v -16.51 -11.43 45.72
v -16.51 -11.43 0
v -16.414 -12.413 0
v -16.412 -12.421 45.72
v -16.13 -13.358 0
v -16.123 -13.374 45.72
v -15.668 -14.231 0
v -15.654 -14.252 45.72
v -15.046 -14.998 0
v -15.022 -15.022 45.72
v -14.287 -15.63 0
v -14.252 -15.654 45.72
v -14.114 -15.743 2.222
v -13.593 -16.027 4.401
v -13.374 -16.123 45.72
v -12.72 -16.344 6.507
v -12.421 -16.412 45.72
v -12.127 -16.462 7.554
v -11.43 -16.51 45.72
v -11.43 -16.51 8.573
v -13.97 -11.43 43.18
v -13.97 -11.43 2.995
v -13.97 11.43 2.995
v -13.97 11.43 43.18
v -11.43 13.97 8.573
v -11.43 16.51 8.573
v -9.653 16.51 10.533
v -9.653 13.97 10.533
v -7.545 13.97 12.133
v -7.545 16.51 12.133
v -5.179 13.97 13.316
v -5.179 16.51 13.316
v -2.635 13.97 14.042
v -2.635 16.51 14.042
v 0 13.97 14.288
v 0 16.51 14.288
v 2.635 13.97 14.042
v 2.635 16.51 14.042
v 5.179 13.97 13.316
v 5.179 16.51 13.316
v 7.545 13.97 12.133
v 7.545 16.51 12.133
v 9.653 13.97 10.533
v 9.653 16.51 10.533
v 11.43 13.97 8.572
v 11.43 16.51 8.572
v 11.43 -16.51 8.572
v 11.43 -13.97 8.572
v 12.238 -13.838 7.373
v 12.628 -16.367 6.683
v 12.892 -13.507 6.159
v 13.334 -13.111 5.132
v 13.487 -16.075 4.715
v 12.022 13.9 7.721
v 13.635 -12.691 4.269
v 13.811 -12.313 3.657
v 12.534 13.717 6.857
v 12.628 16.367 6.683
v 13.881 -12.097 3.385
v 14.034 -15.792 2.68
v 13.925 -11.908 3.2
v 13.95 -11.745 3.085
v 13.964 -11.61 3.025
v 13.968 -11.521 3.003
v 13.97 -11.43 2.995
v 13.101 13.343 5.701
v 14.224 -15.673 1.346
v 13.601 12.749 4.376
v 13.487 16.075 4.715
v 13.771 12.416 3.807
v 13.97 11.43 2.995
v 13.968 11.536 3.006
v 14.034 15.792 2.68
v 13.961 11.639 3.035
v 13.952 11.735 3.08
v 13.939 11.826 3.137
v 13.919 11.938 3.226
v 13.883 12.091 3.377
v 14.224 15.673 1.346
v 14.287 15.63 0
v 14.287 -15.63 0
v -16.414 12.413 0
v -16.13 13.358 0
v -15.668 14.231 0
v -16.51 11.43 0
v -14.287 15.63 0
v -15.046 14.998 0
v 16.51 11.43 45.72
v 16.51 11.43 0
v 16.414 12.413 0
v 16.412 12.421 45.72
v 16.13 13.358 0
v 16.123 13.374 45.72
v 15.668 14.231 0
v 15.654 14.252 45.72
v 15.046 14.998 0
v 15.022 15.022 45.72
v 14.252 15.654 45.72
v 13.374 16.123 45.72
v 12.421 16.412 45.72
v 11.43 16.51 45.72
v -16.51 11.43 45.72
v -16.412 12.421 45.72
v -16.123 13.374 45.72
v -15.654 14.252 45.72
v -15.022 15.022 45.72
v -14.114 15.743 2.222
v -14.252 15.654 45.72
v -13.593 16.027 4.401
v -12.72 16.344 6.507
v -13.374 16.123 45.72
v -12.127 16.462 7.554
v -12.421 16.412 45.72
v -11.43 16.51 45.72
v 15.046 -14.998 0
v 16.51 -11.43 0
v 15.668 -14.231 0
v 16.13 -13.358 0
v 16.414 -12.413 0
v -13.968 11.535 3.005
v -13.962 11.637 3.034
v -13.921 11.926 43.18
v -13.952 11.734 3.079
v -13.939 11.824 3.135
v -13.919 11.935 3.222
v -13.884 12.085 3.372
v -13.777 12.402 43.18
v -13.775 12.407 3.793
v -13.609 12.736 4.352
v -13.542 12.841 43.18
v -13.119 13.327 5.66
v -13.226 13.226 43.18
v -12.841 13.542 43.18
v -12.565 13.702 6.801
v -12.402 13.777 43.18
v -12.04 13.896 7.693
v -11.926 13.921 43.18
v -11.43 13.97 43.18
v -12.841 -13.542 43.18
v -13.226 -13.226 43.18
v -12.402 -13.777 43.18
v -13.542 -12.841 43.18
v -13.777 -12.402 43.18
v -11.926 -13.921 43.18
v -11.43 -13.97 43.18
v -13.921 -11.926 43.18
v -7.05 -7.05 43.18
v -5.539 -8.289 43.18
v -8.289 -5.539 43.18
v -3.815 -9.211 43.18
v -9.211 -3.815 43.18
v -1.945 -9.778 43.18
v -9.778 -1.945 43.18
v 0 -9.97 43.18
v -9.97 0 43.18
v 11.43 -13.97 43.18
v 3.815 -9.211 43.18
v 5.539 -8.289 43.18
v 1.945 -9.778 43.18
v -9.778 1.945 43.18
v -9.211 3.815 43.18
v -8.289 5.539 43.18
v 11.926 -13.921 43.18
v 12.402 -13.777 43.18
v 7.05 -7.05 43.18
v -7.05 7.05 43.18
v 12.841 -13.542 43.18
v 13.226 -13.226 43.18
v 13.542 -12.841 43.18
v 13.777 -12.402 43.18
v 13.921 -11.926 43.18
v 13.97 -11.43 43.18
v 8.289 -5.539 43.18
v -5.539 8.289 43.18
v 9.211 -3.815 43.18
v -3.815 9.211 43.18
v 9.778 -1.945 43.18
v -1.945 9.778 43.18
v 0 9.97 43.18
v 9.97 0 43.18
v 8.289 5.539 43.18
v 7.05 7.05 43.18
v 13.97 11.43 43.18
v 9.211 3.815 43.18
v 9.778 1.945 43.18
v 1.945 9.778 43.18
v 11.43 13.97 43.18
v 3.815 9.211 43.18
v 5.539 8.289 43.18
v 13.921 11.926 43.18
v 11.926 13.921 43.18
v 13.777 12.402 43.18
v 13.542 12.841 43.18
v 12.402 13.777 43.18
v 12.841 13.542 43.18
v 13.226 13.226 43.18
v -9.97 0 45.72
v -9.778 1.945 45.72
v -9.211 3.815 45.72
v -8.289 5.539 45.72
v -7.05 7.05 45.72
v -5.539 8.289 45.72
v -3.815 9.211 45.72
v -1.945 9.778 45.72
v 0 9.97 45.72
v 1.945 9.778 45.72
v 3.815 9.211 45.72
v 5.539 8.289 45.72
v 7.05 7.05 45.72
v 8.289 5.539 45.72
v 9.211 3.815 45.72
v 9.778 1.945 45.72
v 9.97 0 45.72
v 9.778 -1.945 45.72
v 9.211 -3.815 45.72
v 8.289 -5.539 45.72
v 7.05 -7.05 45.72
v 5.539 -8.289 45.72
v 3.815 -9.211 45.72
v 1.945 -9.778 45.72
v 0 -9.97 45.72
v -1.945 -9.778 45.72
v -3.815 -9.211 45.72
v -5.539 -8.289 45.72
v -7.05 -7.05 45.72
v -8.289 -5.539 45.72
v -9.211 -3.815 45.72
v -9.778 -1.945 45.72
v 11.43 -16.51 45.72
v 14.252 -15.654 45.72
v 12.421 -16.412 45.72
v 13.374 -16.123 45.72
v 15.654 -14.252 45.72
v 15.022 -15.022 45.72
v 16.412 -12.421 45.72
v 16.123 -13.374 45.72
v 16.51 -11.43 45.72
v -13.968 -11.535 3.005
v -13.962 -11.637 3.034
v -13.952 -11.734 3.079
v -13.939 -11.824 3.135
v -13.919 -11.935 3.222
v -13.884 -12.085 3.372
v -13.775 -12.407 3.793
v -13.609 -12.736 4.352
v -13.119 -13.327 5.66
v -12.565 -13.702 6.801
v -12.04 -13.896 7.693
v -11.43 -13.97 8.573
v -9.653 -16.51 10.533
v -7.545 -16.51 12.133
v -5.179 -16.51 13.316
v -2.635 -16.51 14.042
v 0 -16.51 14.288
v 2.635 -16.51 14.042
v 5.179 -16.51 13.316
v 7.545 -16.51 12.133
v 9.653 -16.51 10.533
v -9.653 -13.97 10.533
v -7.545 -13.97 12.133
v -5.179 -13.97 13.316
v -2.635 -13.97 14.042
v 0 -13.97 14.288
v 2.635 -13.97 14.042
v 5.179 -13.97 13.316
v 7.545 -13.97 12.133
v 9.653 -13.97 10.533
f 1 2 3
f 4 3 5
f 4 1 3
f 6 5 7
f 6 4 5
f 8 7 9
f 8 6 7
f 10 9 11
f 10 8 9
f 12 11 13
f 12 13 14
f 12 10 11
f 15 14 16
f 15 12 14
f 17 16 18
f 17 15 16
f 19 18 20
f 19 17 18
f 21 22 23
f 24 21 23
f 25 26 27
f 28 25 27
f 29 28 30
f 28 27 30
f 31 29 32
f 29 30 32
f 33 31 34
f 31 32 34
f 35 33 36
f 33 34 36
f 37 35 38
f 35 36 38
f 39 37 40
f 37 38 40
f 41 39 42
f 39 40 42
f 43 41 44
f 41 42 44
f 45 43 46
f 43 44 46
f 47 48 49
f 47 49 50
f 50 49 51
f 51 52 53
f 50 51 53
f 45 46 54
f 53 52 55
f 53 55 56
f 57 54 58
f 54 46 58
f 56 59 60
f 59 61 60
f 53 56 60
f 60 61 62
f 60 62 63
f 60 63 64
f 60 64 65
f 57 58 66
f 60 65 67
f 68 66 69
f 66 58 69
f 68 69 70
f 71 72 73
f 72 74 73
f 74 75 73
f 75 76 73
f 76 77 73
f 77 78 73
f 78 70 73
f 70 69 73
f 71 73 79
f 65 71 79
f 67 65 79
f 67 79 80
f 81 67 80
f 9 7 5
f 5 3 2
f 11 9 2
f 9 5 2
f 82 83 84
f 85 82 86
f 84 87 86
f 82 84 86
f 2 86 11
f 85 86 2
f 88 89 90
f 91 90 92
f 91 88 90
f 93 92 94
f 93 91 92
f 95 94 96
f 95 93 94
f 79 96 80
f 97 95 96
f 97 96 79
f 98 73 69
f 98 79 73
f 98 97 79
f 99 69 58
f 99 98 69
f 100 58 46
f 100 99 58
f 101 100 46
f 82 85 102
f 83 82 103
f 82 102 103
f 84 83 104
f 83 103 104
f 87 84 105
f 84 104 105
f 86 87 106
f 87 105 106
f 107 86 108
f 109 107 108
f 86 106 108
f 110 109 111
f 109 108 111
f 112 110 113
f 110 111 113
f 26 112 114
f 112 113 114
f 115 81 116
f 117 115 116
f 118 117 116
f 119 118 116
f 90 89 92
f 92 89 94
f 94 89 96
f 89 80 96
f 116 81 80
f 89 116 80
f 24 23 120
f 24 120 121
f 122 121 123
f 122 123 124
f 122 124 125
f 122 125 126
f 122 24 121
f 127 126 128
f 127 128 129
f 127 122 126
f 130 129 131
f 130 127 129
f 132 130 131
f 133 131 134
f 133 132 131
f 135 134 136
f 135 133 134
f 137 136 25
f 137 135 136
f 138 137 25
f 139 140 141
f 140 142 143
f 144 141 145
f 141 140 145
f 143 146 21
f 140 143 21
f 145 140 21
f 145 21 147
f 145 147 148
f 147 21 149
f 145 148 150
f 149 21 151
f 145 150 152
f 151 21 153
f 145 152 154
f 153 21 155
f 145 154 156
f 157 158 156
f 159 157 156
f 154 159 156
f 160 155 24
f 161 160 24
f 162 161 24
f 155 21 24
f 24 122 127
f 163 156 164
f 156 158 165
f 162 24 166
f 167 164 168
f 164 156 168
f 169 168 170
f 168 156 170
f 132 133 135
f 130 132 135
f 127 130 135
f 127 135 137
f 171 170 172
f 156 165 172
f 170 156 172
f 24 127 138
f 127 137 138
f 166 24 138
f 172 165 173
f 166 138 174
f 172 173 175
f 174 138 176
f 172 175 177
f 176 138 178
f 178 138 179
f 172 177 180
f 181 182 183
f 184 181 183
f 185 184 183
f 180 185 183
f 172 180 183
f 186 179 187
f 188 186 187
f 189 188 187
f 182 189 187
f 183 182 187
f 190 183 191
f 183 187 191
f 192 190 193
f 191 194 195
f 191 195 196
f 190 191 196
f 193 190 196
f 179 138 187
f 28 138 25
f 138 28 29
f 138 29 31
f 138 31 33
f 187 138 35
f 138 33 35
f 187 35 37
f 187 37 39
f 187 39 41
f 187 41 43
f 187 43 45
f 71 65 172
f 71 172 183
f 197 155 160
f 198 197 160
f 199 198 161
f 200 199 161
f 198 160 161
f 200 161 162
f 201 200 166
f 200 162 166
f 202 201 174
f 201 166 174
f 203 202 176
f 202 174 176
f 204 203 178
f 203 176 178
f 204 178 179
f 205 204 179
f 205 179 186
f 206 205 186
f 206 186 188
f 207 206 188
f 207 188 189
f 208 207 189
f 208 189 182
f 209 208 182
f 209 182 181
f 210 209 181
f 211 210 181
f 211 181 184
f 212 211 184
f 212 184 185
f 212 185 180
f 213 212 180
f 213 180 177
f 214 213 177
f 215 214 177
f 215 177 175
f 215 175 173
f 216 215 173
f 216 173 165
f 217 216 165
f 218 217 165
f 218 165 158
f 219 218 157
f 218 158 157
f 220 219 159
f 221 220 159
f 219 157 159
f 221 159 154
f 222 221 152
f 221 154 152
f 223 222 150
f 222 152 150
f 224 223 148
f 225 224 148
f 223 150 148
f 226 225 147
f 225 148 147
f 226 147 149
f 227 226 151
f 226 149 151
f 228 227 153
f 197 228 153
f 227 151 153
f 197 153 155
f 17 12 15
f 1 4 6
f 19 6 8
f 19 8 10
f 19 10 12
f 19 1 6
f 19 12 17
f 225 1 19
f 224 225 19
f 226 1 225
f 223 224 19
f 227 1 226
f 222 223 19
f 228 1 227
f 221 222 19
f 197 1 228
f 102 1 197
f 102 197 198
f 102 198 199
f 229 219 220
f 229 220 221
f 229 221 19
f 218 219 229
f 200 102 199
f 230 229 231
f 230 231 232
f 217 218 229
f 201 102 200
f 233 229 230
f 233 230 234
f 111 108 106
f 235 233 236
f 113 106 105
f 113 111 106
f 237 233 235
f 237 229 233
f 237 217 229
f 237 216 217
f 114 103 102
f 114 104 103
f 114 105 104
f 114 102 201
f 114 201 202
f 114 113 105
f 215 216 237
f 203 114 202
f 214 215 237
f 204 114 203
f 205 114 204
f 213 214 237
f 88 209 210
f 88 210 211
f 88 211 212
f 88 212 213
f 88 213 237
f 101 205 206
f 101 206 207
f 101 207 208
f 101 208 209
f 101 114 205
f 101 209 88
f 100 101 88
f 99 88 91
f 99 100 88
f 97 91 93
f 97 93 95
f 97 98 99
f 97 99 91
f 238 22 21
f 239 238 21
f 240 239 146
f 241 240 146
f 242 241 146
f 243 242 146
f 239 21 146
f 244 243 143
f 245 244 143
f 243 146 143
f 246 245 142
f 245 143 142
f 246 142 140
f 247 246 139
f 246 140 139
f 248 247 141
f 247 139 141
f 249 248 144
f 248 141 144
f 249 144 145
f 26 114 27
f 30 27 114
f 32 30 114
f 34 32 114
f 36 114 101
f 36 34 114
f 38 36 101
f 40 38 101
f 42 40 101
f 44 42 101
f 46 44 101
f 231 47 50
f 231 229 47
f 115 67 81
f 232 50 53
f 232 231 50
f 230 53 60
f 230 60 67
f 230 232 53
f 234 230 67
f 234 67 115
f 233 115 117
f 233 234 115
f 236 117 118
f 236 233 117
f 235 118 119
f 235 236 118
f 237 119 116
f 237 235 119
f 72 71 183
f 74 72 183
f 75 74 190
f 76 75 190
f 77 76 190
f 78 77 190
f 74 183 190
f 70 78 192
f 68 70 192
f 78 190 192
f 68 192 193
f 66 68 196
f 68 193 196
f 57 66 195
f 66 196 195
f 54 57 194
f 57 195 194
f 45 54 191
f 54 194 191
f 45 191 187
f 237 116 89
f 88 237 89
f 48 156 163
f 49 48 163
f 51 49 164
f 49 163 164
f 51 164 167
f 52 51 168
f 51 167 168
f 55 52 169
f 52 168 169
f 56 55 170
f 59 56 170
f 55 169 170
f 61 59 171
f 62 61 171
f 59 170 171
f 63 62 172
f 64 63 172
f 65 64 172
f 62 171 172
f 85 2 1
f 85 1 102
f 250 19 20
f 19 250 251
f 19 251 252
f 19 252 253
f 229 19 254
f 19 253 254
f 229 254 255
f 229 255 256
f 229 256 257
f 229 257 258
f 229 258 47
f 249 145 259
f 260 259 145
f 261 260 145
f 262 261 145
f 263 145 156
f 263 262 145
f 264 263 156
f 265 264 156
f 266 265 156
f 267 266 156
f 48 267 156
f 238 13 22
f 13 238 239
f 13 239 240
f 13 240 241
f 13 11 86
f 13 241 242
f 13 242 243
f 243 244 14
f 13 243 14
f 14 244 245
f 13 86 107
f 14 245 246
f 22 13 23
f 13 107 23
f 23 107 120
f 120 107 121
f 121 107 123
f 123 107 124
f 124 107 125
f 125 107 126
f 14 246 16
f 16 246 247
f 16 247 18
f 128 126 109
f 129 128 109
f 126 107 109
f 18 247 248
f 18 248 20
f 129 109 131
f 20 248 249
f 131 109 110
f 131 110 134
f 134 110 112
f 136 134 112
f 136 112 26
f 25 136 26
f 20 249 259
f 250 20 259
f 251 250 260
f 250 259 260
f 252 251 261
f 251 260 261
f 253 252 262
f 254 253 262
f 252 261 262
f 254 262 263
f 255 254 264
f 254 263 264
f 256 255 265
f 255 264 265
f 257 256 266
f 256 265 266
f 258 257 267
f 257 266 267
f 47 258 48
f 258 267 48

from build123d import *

# Parameters (mm, degrees)
F0_W     = 33.02
F0_H     = 33.02
F0_R     = 9.9695
F1_DEPTH = 45.72
F2_R     = 5.08
F3_T     = -2.54
F5_D     = 19.939
F7_DEPTH = 33.021


with BuildPart() as f1:
    # F0 (on Top) → F1 (new body)
    with BuildSketch(Plane.XY):
        Rectangle(F0_W, F0_H)
        Circle(F0_R, mode=Mode.SUBTRACT)
        Circle(F0_R)
    extrude(amount=F1_DEPTH)

    # F2
    f2_edges = [f1.edges().sort_by_distance(p)[0] for p in [
        (-16.51, -16.51, 22.86),
        (16.51, -16.51, 22.86),
        (16.51, 16.51, 22.86),
        (-16.51, 16.51, 22.86),
    ]]
    fillet(f2_edges, radius=F2_R)

    # F3
    f3_openings = [f1.faces().sort_by_distance(p)[0] for p in [
        (0, 0, 0),
    ]]
    offset(amount=F3_T, openings=f3_openings)

    # F5 (through all)
    with Locations(Plane.XY.offset(45.72)):
        with Locations((0, 0)):
            Hole(F5_D / 2)

    # F6 (on face) → F7 (cut, through all)
    with BuildSketch(Plane(origin=(0, 16.51, 0), x_dir=(-1, 0, 0), z_dir=(0, 1, 0))):
        with BuildLine():
            Line((11.43, 0), (14.2875, 0))
            ThreePointArc((14.2875, 0), (13.5543126209, 4.518104207), (11.43, 8.5725))
            Line((11.43, 8.5725), (11.43, 0))
        make_face()
        with BuildLine():
            Line((-11.43, 0), (-11.43, 8.5725))
            ThreePointArc((-11.43, 8.5725), (-13.5543126209, 4.518104207), (-14.2875, 0))
            Line((-14.2875, 0), (-11.43, 0))
        make_face()
        with BuildLine():
            Line((11.43, 0), (11.43, 8.5725))
            ThreePointArc((11.43, 8.5725), (0, 14.2875), (-11.43, 8.5725))
            Line((-11.43, 8.5725), (-11.43, 0))
            Line((-11.43, 0), (11.43, 0))
        make_face()
    extrude(amount=-F7_DEPTH, mode=Mode.SUBTRACT)


solid = f1.part
